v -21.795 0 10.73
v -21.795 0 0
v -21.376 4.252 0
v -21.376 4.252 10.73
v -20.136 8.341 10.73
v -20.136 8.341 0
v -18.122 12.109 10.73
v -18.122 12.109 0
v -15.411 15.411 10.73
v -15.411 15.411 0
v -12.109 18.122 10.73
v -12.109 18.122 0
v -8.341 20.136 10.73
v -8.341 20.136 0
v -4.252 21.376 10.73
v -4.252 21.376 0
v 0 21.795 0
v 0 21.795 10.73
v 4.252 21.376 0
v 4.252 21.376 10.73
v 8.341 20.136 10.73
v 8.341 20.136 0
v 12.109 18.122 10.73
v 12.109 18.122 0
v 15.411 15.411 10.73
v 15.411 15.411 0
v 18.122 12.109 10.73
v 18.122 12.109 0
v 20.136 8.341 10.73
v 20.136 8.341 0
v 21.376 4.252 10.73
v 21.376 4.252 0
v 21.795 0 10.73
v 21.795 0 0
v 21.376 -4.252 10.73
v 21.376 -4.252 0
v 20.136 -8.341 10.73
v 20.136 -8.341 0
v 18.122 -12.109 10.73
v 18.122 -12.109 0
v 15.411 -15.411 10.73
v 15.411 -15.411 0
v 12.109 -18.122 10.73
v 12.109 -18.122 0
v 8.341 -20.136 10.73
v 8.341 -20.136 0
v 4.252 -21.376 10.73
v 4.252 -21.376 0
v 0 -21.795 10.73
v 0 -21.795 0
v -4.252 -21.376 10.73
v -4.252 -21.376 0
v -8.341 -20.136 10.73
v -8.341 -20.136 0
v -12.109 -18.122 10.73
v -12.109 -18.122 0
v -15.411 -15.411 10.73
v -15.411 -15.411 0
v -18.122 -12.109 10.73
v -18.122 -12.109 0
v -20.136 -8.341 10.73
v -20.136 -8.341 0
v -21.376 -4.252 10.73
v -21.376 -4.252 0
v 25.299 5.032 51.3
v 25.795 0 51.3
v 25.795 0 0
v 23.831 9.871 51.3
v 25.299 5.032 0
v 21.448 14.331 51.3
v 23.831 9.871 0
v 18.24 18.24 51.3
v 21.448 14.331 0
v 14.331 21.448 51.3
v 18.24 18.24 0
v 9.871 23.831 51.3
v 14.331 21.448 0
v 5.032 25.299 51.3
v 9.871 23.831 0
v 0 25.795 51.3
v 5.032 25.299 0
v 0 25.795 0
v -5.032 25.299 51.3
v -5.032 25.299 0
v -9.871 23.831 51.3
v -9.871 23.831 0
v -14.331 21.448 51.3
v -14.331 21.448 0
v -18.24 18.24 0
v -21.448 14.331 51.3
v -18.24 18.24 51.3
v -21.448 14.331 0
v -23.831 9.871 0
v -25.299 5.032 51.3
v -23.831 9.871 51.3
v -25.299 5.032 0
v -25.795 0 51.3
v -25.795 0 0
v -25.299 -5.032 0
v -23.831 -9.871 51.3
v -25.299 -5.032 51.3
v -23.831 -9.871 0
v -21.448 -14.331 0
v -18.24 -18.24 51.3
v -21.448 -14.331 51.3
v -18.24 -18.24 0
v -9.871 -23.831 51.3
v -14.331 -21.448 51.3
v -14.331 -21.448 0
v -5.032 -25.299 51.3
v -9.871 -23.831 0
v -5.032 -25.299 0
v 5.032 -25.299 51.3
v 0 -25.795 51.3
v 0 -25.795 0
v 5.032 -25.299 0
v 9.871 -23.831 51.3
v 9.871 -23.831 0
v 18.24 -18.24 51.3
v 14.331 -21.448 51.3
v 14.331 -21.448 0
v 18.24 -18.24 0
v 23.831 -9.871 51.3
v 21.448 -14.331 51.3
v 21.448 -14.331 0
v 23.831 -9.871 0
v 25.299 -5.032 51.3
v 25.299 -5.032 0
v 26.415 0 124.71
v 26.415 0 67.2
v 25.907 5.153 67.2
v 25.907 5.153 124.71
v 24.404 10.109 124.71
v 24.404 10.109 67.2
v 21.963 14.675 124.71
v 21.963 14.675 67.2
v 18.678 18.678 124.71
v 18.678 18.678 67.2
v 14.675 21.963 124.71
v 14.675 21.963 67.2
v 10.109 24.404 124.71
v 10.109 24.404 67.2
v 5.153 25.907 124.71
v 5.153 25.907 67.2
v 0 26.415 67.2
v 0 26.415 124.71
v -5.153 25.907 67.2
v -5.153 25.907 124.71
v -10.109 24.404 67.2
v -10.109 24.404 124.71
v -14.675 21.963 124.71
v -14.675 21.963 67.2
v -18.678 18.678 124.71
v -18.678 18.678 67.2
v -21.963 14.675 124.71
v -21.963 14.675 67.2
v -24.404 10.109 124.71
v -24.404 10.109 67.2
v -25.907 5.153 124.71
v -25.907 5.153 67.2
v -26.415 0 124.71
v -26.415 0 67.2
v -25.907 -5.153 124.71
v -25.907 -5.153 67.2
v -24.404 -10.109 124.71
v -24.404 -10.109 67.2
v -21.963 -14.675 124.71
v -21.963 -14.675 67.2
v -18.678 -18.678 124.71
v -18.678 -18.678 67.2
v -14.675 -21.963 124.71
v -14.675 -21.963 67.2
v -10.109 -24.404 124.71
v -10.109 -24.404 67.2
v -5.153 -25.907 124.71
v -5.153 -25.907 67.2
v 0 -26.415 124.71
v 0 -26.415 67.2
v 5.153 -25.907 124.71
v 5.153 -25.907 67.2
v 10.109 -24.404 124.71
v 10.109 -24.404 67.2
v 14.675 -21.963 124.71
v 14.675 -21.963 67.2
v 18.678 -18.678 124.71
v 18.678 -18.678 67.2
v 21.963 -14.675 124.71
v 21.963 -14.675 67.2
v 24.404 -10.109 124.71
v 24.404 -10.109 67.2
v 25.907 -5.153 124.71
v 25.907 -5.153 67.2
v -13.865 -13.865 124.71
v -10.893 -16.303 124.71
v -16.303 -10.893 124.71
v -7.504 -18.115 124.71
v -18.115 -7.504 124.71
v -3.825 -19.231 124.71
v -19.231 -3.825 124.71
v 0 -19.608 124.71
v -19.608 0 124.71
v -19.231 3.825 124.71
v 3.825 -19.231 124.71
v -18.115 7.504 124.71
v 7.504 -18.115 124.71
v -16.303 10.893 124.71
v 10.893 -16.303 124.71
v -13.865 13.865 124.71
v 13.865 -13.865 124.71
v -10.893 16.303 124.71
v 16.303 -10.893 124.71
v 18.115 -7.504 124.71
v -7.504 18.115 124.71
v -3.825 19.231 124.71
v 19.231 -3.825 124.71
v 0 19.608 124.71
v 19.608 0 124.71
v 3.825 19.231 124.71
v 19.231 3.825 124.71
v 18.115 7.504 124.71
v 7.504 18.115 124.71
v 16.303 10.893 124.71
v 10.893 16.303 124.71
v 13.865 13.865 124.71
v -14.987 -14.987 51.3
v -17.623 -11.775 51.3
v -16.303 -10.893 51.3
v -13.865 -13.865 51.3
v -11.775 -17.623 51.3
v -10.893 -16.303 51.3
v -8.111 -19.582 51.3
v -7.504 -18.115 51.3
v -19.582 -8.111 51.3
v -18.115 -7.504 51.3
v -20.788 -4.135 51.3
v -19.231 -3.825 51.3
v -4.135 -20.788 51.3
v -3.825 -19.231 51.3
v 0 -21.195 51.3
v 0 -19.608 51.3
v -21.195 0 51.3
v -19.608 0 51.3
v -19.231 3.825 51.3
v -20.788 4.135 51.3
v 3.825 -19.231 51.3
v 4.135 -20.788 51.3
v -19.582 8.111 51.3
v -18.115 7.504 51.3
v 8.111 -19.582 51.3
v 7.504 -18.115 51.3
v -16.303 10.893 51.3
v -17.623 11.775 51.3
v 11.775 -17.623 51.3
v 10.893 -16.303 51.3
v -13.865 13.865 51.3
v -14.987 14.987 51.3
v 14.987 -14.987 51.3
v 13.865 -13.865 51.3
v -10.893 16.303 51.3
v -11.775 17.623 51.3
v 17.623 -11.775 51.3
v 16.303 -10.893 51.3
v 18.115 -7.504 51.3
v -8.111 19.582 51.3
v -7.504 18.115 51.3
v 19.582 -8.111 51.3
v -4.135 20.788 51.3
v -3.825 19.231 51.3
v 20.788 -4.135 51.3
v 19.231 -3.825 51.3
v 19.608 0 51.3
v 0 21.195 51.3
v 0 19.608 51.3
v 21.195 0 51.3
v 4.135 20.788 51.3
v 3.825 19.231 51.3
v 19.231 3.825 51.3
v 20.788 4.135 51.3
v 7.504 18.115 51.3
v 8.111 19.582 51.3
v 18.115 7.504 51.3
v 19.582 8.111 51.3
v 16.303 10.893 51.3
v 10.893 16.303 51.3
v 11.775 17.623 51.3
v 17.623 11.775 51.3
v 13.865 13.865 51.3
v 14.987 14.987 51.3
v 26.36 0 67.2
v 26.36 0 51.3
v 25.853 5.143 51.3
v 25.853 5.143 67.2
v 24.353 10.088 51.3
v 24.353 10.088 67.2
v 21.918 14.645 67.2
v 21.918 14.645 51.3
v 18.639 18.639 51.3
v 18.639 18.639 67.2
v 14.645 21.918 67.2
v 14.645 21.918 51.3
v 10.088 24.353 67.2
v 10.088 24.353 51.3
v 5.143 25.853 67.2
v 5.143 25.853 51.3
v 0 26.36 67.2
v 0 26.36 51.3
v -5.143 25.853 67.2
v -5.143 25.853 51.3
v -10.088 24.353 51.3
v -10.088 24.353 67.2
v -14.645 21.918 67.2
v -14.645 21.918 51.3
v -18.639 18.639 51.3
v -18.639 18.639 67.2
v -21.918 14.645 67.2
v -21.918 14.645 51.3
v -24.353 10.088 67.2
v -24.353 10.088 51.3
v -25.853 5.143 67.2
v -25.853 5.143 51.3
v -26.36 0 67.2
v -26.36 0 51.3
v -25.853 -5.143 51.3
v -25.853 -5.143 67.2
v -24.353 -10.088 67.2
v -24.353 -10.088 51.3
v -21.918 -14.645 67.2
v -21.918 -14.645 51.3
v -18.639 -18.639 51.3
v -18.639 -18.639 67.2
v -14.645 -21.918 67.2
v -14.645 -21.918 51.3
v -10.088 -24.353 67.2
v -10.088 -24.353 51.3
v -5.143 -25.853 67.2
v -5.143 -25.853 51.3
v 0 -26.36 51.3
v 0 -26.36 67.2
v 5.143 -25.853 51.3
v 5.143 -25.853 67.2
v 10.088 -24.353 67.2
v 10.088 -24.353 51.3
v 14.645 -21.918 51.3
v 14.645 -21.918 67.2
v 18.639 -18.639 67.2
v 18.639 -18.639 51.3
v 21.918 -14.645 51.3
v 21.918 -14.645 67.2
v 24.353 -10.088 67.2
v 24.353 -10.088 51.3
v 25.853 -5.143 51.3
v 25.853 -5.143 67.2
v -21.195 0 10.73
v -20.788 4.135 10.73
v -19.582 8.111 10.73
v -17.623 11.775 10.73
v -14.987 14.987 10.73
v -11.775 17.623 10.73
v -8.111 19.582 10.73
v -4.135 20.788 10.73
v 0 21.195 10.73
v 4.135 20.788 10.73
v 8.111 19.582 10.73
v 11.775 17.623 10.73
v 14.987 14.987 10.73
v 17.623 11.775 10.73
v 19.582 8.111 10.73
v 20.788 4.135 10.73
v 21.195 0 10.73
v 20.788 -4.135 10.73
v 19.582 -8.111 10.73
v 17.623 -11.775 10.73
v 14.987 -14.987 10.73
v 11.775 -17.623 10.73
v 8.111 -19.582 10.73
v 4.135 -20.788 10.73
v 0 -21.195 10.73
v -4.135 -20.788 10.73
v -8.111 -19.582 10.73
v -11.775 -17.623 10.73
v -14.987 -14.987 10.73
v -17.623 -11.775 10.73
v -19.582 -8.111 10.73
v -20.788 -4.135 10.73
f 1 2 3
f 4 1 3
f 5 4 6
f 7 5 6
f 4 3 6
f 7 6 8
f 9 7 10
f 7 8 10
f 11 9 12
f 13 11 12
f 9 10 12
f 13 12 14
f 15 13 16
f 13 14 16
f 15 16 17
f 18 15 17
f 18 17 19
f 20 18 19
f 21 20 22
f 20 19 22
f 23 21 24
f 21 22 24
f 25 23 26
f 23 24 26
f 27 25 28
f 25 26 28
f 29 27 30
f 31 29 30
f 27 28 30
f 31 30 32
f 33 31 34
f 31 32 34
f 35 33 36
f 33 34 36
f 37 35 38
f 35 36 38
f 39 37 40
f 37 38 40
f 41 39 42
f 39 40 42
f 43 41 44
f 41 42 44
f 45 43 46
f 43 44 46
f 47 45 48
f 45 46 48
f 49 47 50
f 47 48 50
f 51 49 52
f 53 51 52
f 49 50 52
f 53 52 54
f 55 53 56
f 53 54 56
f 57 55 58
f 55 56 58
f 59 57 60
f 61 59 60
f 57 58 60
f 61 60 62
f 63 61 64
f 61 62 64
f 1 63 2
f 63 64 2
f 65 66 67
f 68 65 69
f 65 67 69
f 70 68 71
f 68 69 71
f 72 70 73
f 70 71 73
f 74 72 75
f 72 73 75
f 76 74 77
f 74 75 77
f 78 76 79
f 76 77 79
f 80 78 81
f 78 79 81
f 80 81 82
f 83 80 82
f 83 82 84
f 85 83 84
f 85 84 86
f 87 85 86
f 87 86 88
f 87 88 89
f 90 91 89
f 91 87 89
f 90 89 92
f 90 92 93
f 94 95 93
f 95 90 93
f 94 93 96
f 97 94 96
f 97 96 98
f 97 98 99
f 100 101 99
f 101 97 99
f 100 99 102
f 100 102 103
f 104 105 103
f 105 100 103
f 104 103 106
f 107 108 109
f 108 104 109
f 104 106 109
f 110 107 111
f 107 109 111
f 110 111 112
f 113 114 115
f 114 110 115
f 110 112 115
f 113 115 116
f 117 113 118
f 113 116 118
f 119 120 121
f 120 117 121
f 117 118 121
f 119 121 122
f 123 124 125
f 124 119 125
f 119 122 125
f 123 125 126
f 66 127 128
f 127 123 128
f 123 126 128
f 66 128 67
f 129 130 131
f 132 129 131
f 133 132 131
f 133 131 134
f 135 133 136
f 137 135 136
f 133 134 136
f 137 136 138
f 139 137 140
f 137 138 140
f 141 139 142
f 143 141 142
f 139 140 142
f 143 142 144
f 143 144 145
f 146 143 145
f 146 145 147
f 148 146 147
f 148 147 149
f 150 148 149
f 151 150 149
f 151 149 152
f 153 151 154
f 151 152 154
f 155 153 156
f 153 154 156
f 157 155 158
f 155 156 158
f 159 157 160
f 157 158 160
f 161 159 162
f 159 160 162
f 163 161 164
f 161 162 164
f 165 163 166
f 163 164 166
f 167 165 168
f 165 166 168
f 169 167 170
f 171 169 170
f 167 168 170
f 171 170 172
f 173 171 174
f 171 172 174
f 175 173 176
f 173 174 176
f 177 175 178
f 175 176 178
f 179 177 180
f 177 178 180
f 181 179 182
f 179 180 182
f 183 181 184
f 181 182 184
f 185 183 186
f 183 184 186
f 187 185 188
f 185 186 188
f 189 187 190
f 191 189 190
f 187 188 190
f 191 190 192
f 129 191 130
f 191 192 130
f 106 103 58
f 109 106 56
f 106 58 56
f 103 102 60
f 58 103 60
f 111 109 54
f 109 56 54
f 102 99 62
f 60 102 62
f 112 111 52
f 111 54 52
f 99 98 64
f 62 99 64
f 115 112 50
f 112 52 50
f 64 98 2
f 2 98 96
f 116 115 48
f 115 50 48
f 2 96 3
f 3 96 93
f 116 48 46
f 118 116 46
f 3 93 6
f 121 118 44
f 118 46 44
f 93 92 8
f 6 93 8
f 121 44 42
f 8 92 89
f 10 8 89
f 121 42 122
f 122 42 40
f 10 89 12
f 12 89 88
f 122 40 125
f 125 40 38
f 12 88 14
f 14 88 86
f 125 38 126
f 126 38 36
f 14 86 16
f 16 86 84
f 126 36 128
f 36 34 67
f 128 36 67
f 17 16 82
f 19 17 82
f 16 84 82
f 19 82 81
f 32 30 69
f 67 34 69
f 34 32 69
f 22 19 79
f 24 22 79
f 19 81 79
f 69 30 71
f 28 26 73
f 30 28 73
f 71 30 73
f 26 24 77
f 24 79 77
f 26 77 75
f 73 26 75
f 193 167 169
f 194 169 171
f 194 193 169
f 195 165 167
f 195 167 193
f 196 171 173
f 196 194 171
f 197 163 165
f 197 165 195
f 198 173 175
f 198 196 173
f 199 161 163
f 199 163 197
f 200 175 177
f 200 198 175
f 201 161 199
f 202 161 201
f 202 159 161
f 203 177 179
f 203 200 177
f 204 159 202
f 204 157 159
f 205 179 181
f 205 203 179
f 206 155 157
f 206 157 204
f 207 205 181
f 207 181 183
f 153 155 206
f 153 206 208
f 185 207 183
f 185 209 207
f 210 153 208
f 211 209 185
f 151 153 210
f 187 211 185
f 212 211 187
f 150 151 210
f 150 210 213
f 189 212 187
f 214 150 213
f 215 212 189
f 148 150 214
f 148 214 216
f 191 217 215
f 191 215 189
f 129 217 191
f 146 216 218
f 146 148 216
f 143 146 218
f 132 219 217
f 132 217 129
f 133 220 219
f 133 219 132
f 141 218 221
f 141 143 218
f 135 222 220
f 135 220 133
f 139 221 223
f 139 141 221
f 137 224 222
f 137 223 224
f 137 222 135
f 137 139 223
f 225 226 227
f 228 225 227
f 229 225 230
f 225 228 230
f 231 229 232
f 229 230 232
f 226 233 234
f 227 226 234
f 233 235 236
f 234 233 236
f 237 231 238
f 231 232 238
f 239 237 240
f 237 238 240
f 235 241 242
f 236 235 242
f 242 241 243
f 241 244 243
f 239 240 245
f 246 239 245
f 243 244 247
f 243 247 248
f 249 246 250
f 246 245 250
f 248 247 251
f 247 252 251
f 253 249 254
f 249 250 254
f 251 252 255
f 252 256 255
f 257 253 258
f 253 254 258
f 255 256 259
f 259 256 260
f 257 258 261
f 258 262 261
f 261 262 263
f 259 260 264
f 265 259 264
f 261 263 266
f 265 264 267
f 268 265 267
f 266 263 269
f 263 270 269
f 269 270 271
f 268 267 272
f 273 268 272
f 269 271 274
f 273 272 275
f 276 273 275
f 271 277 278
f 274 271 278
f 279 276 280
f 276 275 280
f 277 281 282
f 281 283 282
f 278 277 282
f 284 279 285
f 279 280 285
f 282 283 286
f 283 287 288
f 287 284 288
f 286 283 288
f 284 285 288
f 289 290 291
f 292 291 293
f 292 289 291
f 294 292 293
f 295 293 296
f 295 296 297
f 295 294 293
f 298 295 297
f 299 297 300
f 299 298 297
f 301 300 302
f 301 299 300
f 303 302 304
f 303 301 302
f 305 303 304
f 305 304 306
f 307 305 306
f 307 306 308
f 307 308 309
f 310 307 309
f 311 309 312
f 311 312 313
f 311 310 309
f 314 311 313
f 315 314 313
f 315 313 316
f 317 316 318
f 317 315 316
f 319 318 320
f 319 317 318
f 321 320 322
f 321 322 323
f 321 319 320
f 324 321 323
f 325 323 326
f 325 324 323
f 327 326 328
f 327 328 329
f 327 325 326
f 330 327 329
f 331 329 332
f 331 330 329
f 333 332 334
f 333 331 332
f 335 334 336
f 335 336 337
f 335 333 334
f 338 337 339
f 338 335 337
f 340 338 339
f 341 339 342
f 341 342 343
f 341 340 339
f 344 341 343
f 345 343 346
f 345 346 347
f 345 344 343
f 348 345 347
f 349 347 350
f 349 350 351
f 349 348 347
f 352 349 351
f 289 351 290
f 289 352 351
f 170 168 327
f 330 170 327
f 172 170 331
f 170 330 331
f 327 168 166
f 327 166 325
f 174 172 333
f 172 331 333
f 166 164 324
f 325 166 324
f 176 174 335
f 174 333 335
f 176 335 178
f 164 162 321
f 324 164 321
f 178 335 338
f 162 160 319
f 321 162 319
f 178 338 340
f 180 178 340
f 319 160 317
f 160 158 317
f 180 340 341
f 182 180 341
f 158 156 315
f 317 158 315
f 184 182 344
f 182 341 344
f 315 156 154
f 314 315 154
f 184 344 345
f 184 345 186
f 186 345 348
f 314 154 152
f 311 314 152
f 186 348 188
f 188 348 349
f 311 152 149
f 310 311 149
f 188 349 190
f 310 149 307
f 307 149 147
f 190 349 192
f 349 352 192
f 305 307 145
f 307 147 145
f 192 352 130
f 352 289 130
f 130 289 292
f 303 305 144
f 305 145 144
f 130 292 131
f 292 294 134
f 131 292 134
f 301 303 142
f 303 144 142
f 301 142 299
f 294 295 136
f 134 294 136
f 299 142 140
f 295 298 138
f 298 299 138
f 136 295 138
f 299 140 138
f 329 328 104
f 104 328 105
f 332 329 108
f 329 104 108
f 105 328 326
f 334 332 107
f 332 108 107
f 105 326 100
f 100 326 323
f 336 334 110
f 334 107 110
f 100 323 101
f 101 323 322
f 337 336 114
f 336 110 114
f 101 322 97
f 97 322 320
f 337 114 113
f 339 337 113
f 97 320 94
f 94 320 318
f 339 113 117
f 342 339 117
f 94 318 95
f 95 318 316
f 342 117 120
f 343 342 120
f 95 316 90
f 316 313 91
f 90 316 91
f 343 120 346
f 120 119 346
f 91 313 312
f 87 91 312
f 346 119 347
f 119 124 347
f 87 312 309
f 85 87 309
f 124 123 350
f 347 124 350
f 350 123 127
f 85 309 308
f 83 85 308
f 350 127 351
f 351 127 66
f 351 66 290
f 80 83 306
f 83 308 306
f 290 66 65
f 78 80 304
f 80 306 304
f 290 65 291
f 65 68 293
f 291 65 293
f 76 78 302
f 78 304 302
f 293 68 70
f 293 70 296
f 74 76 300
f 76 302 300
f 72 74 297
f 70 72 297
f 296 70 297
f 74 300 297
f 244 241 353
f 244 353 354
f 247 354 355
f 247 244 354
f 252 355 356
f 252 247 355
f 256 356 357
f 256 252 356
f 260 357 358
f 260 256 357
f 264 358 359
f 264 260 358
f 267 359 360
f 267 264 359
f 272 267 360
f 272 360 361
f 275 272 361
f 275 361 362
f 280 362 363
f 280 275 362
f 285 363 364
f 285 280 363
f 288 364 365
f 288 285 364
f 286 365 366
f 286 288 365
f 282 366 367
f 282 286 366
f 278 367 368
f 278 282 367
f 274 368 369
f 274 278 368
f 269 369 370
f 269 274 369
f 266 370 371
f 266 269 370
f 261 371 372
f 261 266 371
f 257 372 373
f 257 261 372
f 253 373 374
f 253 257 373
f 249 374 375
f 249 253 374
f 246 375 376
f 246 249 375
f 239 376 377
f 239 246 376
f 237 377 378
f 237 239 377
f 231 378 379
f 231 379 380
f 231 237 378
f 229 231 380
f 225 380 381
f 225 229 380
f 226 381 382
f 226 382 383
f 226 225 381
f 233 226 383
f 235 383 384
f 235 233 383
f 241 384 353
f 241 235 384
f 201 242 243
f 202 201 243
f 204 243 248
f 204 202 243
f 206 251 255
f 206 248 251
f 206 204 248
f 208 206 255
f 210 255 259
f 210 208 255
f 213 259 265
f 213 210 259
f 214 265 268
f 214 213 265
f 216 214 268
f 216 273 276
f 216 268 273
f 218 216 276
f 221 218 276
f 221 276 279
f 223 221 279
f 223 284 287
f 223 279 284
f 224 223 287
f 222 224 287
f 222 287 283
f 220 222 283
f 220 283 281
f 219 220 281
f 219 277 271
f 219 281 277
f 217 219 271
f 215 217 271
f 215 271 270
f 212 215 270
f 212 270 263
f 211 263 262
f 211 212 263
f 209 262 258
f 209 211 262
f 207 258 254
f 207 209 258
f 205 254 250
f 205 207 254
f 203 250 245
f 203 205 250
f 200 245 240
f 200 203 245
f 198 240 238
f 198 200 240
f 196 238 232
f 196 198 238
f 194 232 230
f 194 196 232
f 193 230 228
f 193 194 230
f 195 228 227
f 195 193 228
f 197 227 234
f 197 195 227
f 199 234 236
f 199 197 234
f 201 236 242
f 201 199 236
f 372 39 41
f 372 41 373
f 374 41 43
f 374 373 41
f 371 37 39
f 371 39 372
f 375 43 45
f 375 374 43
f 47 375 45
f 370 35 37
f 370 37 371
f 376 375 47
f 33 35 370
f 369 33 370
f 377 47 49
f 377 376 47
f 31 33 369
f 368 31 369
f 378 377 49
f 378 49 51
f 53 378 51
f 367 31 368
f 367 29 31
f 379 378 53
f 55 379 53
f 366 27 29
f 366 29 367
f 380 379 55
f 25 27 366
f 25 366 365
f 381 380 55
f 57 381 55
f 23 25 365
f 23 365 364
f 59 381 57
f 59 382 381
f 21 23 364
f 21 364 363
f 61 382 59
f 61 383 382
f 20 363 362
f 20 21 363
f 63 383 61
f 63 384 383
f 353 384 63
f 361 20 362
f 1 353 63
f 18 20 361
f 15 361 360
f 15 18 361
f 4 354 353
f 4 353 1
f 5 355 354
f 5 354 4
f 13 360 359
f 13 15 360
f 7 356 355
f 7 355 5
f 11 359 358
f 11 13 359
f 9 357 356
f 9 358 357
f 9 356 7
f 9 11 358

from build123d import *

# Parameters (mm, degrees)
SKETCH1_R               = 25.795
SKETCH1_R_2             = 18.885
BOSS_EXTRUDE1_DEPTH     = 67.2
SKETCH2_R               = 21.795
SKETCH2_R_2             = 21.195
CUT_EXTRUDE2_DEPTH      = 10.73
CUT_EXTRUDE3_DEPTH      = 77.463089462
CUT_EXTRUDE3_DEPTH_BACK = 77.463089462
SKETCH3_R               = 21.195
SKETCH3_R_2             = 18.885
SKETCH4_R               = 26.36
BOSS_EXTRUDE2_DEPTH     = 15.9
SKETCH5_R               = 26.415
BOSS_EXTRUDE3_DEPTH     = 57.51
CUT_EXTRUDE6_DEPTH      = 83.368273929
CUT_EXTRUDE6_DEPTH_BACK = 83.368273929
SKETCH10_R              = 19.607658562


with BuildPart() as part:
    # Sketch1 → Boss-Extrude1 (new body)
    with BuildSketch(Plane.XY):
        Circle(SKETCH1_R)
        Circle(SKETCH1_R_2, mode=Mode.SUBTRACT)
    extrude(amount=BOSS_EXTRUDE1_DEPTH)

    # Sketch2 → Cut-Extrude2 (cut)
    with BuildSketch(Plane(origin=(0, 0, 0), x_dir=(-1, 0, 0), z_dir=(0, 0, -1))):
        Circle(SKETCH2_R)
        Circle(SKETCH2_R_2, mode=Mode.SUBTRACT)
    extrude(amount=-CUT_EXTRUDE2_DEPTH, mode=Mode.SUBTRACT)

    # Sketch3 → Cut-Extrude3 (cut, two sides: drawn at the far end of the back side and taken through both)
    with BuildSketch(Plane(origin=(0, 0, 0), x_dir=(-1, 0, 0), z_dir=(0, 0, -1)).offset(-CUT_EXTRUDE3_DEPTH_BACK)):
        Circle(SKETCH3_R)
        Circle(SKETCH3_R_2, mode=Mode.SUBTRACT)
    extrude(amount=CUT_EXTRUDE3_DEPTH + CUT_EXTRUDE3_DEPTH_BACK, mode=Mode.SUBTRACT)

    # Sketch4 → Boss-Extrude2 (add)
    with BuildSketch(Plane.XY.offset(67.2)):
        Circle(SKETCH4_R)
    extrude(amount=-BOSS_EXTRUDE2_DEPTH)

    # Sketch5 → Boss-Extrude3 (add)
    with BuildSketch(Plane.XY.offset(67.2)):
        Circle(SKETCH5_R)
    extrude(amount=BOSS_EXTRUDE3_DEPTH)

    # Sketch10 → Cut-Extrude6 (cut, two sides: drawn at the far end of the back side and taken through both)
    with BuildSketch(Plane(origin=(0, 0, 51.3), x_dir=(-1, 0, 0), z_dir=(0, 0, -1)).offset(-CUT_EXTRUDE6_DEPTH_BACK)):
        Circle(SKETCH10_R)
    extrude(amount=CUT_EXTRUDE6_DEPTH + CUT_EXTRUDE6_DEPTH_BACK, mode=Mode.SUBTRACT)


solid = part.part
